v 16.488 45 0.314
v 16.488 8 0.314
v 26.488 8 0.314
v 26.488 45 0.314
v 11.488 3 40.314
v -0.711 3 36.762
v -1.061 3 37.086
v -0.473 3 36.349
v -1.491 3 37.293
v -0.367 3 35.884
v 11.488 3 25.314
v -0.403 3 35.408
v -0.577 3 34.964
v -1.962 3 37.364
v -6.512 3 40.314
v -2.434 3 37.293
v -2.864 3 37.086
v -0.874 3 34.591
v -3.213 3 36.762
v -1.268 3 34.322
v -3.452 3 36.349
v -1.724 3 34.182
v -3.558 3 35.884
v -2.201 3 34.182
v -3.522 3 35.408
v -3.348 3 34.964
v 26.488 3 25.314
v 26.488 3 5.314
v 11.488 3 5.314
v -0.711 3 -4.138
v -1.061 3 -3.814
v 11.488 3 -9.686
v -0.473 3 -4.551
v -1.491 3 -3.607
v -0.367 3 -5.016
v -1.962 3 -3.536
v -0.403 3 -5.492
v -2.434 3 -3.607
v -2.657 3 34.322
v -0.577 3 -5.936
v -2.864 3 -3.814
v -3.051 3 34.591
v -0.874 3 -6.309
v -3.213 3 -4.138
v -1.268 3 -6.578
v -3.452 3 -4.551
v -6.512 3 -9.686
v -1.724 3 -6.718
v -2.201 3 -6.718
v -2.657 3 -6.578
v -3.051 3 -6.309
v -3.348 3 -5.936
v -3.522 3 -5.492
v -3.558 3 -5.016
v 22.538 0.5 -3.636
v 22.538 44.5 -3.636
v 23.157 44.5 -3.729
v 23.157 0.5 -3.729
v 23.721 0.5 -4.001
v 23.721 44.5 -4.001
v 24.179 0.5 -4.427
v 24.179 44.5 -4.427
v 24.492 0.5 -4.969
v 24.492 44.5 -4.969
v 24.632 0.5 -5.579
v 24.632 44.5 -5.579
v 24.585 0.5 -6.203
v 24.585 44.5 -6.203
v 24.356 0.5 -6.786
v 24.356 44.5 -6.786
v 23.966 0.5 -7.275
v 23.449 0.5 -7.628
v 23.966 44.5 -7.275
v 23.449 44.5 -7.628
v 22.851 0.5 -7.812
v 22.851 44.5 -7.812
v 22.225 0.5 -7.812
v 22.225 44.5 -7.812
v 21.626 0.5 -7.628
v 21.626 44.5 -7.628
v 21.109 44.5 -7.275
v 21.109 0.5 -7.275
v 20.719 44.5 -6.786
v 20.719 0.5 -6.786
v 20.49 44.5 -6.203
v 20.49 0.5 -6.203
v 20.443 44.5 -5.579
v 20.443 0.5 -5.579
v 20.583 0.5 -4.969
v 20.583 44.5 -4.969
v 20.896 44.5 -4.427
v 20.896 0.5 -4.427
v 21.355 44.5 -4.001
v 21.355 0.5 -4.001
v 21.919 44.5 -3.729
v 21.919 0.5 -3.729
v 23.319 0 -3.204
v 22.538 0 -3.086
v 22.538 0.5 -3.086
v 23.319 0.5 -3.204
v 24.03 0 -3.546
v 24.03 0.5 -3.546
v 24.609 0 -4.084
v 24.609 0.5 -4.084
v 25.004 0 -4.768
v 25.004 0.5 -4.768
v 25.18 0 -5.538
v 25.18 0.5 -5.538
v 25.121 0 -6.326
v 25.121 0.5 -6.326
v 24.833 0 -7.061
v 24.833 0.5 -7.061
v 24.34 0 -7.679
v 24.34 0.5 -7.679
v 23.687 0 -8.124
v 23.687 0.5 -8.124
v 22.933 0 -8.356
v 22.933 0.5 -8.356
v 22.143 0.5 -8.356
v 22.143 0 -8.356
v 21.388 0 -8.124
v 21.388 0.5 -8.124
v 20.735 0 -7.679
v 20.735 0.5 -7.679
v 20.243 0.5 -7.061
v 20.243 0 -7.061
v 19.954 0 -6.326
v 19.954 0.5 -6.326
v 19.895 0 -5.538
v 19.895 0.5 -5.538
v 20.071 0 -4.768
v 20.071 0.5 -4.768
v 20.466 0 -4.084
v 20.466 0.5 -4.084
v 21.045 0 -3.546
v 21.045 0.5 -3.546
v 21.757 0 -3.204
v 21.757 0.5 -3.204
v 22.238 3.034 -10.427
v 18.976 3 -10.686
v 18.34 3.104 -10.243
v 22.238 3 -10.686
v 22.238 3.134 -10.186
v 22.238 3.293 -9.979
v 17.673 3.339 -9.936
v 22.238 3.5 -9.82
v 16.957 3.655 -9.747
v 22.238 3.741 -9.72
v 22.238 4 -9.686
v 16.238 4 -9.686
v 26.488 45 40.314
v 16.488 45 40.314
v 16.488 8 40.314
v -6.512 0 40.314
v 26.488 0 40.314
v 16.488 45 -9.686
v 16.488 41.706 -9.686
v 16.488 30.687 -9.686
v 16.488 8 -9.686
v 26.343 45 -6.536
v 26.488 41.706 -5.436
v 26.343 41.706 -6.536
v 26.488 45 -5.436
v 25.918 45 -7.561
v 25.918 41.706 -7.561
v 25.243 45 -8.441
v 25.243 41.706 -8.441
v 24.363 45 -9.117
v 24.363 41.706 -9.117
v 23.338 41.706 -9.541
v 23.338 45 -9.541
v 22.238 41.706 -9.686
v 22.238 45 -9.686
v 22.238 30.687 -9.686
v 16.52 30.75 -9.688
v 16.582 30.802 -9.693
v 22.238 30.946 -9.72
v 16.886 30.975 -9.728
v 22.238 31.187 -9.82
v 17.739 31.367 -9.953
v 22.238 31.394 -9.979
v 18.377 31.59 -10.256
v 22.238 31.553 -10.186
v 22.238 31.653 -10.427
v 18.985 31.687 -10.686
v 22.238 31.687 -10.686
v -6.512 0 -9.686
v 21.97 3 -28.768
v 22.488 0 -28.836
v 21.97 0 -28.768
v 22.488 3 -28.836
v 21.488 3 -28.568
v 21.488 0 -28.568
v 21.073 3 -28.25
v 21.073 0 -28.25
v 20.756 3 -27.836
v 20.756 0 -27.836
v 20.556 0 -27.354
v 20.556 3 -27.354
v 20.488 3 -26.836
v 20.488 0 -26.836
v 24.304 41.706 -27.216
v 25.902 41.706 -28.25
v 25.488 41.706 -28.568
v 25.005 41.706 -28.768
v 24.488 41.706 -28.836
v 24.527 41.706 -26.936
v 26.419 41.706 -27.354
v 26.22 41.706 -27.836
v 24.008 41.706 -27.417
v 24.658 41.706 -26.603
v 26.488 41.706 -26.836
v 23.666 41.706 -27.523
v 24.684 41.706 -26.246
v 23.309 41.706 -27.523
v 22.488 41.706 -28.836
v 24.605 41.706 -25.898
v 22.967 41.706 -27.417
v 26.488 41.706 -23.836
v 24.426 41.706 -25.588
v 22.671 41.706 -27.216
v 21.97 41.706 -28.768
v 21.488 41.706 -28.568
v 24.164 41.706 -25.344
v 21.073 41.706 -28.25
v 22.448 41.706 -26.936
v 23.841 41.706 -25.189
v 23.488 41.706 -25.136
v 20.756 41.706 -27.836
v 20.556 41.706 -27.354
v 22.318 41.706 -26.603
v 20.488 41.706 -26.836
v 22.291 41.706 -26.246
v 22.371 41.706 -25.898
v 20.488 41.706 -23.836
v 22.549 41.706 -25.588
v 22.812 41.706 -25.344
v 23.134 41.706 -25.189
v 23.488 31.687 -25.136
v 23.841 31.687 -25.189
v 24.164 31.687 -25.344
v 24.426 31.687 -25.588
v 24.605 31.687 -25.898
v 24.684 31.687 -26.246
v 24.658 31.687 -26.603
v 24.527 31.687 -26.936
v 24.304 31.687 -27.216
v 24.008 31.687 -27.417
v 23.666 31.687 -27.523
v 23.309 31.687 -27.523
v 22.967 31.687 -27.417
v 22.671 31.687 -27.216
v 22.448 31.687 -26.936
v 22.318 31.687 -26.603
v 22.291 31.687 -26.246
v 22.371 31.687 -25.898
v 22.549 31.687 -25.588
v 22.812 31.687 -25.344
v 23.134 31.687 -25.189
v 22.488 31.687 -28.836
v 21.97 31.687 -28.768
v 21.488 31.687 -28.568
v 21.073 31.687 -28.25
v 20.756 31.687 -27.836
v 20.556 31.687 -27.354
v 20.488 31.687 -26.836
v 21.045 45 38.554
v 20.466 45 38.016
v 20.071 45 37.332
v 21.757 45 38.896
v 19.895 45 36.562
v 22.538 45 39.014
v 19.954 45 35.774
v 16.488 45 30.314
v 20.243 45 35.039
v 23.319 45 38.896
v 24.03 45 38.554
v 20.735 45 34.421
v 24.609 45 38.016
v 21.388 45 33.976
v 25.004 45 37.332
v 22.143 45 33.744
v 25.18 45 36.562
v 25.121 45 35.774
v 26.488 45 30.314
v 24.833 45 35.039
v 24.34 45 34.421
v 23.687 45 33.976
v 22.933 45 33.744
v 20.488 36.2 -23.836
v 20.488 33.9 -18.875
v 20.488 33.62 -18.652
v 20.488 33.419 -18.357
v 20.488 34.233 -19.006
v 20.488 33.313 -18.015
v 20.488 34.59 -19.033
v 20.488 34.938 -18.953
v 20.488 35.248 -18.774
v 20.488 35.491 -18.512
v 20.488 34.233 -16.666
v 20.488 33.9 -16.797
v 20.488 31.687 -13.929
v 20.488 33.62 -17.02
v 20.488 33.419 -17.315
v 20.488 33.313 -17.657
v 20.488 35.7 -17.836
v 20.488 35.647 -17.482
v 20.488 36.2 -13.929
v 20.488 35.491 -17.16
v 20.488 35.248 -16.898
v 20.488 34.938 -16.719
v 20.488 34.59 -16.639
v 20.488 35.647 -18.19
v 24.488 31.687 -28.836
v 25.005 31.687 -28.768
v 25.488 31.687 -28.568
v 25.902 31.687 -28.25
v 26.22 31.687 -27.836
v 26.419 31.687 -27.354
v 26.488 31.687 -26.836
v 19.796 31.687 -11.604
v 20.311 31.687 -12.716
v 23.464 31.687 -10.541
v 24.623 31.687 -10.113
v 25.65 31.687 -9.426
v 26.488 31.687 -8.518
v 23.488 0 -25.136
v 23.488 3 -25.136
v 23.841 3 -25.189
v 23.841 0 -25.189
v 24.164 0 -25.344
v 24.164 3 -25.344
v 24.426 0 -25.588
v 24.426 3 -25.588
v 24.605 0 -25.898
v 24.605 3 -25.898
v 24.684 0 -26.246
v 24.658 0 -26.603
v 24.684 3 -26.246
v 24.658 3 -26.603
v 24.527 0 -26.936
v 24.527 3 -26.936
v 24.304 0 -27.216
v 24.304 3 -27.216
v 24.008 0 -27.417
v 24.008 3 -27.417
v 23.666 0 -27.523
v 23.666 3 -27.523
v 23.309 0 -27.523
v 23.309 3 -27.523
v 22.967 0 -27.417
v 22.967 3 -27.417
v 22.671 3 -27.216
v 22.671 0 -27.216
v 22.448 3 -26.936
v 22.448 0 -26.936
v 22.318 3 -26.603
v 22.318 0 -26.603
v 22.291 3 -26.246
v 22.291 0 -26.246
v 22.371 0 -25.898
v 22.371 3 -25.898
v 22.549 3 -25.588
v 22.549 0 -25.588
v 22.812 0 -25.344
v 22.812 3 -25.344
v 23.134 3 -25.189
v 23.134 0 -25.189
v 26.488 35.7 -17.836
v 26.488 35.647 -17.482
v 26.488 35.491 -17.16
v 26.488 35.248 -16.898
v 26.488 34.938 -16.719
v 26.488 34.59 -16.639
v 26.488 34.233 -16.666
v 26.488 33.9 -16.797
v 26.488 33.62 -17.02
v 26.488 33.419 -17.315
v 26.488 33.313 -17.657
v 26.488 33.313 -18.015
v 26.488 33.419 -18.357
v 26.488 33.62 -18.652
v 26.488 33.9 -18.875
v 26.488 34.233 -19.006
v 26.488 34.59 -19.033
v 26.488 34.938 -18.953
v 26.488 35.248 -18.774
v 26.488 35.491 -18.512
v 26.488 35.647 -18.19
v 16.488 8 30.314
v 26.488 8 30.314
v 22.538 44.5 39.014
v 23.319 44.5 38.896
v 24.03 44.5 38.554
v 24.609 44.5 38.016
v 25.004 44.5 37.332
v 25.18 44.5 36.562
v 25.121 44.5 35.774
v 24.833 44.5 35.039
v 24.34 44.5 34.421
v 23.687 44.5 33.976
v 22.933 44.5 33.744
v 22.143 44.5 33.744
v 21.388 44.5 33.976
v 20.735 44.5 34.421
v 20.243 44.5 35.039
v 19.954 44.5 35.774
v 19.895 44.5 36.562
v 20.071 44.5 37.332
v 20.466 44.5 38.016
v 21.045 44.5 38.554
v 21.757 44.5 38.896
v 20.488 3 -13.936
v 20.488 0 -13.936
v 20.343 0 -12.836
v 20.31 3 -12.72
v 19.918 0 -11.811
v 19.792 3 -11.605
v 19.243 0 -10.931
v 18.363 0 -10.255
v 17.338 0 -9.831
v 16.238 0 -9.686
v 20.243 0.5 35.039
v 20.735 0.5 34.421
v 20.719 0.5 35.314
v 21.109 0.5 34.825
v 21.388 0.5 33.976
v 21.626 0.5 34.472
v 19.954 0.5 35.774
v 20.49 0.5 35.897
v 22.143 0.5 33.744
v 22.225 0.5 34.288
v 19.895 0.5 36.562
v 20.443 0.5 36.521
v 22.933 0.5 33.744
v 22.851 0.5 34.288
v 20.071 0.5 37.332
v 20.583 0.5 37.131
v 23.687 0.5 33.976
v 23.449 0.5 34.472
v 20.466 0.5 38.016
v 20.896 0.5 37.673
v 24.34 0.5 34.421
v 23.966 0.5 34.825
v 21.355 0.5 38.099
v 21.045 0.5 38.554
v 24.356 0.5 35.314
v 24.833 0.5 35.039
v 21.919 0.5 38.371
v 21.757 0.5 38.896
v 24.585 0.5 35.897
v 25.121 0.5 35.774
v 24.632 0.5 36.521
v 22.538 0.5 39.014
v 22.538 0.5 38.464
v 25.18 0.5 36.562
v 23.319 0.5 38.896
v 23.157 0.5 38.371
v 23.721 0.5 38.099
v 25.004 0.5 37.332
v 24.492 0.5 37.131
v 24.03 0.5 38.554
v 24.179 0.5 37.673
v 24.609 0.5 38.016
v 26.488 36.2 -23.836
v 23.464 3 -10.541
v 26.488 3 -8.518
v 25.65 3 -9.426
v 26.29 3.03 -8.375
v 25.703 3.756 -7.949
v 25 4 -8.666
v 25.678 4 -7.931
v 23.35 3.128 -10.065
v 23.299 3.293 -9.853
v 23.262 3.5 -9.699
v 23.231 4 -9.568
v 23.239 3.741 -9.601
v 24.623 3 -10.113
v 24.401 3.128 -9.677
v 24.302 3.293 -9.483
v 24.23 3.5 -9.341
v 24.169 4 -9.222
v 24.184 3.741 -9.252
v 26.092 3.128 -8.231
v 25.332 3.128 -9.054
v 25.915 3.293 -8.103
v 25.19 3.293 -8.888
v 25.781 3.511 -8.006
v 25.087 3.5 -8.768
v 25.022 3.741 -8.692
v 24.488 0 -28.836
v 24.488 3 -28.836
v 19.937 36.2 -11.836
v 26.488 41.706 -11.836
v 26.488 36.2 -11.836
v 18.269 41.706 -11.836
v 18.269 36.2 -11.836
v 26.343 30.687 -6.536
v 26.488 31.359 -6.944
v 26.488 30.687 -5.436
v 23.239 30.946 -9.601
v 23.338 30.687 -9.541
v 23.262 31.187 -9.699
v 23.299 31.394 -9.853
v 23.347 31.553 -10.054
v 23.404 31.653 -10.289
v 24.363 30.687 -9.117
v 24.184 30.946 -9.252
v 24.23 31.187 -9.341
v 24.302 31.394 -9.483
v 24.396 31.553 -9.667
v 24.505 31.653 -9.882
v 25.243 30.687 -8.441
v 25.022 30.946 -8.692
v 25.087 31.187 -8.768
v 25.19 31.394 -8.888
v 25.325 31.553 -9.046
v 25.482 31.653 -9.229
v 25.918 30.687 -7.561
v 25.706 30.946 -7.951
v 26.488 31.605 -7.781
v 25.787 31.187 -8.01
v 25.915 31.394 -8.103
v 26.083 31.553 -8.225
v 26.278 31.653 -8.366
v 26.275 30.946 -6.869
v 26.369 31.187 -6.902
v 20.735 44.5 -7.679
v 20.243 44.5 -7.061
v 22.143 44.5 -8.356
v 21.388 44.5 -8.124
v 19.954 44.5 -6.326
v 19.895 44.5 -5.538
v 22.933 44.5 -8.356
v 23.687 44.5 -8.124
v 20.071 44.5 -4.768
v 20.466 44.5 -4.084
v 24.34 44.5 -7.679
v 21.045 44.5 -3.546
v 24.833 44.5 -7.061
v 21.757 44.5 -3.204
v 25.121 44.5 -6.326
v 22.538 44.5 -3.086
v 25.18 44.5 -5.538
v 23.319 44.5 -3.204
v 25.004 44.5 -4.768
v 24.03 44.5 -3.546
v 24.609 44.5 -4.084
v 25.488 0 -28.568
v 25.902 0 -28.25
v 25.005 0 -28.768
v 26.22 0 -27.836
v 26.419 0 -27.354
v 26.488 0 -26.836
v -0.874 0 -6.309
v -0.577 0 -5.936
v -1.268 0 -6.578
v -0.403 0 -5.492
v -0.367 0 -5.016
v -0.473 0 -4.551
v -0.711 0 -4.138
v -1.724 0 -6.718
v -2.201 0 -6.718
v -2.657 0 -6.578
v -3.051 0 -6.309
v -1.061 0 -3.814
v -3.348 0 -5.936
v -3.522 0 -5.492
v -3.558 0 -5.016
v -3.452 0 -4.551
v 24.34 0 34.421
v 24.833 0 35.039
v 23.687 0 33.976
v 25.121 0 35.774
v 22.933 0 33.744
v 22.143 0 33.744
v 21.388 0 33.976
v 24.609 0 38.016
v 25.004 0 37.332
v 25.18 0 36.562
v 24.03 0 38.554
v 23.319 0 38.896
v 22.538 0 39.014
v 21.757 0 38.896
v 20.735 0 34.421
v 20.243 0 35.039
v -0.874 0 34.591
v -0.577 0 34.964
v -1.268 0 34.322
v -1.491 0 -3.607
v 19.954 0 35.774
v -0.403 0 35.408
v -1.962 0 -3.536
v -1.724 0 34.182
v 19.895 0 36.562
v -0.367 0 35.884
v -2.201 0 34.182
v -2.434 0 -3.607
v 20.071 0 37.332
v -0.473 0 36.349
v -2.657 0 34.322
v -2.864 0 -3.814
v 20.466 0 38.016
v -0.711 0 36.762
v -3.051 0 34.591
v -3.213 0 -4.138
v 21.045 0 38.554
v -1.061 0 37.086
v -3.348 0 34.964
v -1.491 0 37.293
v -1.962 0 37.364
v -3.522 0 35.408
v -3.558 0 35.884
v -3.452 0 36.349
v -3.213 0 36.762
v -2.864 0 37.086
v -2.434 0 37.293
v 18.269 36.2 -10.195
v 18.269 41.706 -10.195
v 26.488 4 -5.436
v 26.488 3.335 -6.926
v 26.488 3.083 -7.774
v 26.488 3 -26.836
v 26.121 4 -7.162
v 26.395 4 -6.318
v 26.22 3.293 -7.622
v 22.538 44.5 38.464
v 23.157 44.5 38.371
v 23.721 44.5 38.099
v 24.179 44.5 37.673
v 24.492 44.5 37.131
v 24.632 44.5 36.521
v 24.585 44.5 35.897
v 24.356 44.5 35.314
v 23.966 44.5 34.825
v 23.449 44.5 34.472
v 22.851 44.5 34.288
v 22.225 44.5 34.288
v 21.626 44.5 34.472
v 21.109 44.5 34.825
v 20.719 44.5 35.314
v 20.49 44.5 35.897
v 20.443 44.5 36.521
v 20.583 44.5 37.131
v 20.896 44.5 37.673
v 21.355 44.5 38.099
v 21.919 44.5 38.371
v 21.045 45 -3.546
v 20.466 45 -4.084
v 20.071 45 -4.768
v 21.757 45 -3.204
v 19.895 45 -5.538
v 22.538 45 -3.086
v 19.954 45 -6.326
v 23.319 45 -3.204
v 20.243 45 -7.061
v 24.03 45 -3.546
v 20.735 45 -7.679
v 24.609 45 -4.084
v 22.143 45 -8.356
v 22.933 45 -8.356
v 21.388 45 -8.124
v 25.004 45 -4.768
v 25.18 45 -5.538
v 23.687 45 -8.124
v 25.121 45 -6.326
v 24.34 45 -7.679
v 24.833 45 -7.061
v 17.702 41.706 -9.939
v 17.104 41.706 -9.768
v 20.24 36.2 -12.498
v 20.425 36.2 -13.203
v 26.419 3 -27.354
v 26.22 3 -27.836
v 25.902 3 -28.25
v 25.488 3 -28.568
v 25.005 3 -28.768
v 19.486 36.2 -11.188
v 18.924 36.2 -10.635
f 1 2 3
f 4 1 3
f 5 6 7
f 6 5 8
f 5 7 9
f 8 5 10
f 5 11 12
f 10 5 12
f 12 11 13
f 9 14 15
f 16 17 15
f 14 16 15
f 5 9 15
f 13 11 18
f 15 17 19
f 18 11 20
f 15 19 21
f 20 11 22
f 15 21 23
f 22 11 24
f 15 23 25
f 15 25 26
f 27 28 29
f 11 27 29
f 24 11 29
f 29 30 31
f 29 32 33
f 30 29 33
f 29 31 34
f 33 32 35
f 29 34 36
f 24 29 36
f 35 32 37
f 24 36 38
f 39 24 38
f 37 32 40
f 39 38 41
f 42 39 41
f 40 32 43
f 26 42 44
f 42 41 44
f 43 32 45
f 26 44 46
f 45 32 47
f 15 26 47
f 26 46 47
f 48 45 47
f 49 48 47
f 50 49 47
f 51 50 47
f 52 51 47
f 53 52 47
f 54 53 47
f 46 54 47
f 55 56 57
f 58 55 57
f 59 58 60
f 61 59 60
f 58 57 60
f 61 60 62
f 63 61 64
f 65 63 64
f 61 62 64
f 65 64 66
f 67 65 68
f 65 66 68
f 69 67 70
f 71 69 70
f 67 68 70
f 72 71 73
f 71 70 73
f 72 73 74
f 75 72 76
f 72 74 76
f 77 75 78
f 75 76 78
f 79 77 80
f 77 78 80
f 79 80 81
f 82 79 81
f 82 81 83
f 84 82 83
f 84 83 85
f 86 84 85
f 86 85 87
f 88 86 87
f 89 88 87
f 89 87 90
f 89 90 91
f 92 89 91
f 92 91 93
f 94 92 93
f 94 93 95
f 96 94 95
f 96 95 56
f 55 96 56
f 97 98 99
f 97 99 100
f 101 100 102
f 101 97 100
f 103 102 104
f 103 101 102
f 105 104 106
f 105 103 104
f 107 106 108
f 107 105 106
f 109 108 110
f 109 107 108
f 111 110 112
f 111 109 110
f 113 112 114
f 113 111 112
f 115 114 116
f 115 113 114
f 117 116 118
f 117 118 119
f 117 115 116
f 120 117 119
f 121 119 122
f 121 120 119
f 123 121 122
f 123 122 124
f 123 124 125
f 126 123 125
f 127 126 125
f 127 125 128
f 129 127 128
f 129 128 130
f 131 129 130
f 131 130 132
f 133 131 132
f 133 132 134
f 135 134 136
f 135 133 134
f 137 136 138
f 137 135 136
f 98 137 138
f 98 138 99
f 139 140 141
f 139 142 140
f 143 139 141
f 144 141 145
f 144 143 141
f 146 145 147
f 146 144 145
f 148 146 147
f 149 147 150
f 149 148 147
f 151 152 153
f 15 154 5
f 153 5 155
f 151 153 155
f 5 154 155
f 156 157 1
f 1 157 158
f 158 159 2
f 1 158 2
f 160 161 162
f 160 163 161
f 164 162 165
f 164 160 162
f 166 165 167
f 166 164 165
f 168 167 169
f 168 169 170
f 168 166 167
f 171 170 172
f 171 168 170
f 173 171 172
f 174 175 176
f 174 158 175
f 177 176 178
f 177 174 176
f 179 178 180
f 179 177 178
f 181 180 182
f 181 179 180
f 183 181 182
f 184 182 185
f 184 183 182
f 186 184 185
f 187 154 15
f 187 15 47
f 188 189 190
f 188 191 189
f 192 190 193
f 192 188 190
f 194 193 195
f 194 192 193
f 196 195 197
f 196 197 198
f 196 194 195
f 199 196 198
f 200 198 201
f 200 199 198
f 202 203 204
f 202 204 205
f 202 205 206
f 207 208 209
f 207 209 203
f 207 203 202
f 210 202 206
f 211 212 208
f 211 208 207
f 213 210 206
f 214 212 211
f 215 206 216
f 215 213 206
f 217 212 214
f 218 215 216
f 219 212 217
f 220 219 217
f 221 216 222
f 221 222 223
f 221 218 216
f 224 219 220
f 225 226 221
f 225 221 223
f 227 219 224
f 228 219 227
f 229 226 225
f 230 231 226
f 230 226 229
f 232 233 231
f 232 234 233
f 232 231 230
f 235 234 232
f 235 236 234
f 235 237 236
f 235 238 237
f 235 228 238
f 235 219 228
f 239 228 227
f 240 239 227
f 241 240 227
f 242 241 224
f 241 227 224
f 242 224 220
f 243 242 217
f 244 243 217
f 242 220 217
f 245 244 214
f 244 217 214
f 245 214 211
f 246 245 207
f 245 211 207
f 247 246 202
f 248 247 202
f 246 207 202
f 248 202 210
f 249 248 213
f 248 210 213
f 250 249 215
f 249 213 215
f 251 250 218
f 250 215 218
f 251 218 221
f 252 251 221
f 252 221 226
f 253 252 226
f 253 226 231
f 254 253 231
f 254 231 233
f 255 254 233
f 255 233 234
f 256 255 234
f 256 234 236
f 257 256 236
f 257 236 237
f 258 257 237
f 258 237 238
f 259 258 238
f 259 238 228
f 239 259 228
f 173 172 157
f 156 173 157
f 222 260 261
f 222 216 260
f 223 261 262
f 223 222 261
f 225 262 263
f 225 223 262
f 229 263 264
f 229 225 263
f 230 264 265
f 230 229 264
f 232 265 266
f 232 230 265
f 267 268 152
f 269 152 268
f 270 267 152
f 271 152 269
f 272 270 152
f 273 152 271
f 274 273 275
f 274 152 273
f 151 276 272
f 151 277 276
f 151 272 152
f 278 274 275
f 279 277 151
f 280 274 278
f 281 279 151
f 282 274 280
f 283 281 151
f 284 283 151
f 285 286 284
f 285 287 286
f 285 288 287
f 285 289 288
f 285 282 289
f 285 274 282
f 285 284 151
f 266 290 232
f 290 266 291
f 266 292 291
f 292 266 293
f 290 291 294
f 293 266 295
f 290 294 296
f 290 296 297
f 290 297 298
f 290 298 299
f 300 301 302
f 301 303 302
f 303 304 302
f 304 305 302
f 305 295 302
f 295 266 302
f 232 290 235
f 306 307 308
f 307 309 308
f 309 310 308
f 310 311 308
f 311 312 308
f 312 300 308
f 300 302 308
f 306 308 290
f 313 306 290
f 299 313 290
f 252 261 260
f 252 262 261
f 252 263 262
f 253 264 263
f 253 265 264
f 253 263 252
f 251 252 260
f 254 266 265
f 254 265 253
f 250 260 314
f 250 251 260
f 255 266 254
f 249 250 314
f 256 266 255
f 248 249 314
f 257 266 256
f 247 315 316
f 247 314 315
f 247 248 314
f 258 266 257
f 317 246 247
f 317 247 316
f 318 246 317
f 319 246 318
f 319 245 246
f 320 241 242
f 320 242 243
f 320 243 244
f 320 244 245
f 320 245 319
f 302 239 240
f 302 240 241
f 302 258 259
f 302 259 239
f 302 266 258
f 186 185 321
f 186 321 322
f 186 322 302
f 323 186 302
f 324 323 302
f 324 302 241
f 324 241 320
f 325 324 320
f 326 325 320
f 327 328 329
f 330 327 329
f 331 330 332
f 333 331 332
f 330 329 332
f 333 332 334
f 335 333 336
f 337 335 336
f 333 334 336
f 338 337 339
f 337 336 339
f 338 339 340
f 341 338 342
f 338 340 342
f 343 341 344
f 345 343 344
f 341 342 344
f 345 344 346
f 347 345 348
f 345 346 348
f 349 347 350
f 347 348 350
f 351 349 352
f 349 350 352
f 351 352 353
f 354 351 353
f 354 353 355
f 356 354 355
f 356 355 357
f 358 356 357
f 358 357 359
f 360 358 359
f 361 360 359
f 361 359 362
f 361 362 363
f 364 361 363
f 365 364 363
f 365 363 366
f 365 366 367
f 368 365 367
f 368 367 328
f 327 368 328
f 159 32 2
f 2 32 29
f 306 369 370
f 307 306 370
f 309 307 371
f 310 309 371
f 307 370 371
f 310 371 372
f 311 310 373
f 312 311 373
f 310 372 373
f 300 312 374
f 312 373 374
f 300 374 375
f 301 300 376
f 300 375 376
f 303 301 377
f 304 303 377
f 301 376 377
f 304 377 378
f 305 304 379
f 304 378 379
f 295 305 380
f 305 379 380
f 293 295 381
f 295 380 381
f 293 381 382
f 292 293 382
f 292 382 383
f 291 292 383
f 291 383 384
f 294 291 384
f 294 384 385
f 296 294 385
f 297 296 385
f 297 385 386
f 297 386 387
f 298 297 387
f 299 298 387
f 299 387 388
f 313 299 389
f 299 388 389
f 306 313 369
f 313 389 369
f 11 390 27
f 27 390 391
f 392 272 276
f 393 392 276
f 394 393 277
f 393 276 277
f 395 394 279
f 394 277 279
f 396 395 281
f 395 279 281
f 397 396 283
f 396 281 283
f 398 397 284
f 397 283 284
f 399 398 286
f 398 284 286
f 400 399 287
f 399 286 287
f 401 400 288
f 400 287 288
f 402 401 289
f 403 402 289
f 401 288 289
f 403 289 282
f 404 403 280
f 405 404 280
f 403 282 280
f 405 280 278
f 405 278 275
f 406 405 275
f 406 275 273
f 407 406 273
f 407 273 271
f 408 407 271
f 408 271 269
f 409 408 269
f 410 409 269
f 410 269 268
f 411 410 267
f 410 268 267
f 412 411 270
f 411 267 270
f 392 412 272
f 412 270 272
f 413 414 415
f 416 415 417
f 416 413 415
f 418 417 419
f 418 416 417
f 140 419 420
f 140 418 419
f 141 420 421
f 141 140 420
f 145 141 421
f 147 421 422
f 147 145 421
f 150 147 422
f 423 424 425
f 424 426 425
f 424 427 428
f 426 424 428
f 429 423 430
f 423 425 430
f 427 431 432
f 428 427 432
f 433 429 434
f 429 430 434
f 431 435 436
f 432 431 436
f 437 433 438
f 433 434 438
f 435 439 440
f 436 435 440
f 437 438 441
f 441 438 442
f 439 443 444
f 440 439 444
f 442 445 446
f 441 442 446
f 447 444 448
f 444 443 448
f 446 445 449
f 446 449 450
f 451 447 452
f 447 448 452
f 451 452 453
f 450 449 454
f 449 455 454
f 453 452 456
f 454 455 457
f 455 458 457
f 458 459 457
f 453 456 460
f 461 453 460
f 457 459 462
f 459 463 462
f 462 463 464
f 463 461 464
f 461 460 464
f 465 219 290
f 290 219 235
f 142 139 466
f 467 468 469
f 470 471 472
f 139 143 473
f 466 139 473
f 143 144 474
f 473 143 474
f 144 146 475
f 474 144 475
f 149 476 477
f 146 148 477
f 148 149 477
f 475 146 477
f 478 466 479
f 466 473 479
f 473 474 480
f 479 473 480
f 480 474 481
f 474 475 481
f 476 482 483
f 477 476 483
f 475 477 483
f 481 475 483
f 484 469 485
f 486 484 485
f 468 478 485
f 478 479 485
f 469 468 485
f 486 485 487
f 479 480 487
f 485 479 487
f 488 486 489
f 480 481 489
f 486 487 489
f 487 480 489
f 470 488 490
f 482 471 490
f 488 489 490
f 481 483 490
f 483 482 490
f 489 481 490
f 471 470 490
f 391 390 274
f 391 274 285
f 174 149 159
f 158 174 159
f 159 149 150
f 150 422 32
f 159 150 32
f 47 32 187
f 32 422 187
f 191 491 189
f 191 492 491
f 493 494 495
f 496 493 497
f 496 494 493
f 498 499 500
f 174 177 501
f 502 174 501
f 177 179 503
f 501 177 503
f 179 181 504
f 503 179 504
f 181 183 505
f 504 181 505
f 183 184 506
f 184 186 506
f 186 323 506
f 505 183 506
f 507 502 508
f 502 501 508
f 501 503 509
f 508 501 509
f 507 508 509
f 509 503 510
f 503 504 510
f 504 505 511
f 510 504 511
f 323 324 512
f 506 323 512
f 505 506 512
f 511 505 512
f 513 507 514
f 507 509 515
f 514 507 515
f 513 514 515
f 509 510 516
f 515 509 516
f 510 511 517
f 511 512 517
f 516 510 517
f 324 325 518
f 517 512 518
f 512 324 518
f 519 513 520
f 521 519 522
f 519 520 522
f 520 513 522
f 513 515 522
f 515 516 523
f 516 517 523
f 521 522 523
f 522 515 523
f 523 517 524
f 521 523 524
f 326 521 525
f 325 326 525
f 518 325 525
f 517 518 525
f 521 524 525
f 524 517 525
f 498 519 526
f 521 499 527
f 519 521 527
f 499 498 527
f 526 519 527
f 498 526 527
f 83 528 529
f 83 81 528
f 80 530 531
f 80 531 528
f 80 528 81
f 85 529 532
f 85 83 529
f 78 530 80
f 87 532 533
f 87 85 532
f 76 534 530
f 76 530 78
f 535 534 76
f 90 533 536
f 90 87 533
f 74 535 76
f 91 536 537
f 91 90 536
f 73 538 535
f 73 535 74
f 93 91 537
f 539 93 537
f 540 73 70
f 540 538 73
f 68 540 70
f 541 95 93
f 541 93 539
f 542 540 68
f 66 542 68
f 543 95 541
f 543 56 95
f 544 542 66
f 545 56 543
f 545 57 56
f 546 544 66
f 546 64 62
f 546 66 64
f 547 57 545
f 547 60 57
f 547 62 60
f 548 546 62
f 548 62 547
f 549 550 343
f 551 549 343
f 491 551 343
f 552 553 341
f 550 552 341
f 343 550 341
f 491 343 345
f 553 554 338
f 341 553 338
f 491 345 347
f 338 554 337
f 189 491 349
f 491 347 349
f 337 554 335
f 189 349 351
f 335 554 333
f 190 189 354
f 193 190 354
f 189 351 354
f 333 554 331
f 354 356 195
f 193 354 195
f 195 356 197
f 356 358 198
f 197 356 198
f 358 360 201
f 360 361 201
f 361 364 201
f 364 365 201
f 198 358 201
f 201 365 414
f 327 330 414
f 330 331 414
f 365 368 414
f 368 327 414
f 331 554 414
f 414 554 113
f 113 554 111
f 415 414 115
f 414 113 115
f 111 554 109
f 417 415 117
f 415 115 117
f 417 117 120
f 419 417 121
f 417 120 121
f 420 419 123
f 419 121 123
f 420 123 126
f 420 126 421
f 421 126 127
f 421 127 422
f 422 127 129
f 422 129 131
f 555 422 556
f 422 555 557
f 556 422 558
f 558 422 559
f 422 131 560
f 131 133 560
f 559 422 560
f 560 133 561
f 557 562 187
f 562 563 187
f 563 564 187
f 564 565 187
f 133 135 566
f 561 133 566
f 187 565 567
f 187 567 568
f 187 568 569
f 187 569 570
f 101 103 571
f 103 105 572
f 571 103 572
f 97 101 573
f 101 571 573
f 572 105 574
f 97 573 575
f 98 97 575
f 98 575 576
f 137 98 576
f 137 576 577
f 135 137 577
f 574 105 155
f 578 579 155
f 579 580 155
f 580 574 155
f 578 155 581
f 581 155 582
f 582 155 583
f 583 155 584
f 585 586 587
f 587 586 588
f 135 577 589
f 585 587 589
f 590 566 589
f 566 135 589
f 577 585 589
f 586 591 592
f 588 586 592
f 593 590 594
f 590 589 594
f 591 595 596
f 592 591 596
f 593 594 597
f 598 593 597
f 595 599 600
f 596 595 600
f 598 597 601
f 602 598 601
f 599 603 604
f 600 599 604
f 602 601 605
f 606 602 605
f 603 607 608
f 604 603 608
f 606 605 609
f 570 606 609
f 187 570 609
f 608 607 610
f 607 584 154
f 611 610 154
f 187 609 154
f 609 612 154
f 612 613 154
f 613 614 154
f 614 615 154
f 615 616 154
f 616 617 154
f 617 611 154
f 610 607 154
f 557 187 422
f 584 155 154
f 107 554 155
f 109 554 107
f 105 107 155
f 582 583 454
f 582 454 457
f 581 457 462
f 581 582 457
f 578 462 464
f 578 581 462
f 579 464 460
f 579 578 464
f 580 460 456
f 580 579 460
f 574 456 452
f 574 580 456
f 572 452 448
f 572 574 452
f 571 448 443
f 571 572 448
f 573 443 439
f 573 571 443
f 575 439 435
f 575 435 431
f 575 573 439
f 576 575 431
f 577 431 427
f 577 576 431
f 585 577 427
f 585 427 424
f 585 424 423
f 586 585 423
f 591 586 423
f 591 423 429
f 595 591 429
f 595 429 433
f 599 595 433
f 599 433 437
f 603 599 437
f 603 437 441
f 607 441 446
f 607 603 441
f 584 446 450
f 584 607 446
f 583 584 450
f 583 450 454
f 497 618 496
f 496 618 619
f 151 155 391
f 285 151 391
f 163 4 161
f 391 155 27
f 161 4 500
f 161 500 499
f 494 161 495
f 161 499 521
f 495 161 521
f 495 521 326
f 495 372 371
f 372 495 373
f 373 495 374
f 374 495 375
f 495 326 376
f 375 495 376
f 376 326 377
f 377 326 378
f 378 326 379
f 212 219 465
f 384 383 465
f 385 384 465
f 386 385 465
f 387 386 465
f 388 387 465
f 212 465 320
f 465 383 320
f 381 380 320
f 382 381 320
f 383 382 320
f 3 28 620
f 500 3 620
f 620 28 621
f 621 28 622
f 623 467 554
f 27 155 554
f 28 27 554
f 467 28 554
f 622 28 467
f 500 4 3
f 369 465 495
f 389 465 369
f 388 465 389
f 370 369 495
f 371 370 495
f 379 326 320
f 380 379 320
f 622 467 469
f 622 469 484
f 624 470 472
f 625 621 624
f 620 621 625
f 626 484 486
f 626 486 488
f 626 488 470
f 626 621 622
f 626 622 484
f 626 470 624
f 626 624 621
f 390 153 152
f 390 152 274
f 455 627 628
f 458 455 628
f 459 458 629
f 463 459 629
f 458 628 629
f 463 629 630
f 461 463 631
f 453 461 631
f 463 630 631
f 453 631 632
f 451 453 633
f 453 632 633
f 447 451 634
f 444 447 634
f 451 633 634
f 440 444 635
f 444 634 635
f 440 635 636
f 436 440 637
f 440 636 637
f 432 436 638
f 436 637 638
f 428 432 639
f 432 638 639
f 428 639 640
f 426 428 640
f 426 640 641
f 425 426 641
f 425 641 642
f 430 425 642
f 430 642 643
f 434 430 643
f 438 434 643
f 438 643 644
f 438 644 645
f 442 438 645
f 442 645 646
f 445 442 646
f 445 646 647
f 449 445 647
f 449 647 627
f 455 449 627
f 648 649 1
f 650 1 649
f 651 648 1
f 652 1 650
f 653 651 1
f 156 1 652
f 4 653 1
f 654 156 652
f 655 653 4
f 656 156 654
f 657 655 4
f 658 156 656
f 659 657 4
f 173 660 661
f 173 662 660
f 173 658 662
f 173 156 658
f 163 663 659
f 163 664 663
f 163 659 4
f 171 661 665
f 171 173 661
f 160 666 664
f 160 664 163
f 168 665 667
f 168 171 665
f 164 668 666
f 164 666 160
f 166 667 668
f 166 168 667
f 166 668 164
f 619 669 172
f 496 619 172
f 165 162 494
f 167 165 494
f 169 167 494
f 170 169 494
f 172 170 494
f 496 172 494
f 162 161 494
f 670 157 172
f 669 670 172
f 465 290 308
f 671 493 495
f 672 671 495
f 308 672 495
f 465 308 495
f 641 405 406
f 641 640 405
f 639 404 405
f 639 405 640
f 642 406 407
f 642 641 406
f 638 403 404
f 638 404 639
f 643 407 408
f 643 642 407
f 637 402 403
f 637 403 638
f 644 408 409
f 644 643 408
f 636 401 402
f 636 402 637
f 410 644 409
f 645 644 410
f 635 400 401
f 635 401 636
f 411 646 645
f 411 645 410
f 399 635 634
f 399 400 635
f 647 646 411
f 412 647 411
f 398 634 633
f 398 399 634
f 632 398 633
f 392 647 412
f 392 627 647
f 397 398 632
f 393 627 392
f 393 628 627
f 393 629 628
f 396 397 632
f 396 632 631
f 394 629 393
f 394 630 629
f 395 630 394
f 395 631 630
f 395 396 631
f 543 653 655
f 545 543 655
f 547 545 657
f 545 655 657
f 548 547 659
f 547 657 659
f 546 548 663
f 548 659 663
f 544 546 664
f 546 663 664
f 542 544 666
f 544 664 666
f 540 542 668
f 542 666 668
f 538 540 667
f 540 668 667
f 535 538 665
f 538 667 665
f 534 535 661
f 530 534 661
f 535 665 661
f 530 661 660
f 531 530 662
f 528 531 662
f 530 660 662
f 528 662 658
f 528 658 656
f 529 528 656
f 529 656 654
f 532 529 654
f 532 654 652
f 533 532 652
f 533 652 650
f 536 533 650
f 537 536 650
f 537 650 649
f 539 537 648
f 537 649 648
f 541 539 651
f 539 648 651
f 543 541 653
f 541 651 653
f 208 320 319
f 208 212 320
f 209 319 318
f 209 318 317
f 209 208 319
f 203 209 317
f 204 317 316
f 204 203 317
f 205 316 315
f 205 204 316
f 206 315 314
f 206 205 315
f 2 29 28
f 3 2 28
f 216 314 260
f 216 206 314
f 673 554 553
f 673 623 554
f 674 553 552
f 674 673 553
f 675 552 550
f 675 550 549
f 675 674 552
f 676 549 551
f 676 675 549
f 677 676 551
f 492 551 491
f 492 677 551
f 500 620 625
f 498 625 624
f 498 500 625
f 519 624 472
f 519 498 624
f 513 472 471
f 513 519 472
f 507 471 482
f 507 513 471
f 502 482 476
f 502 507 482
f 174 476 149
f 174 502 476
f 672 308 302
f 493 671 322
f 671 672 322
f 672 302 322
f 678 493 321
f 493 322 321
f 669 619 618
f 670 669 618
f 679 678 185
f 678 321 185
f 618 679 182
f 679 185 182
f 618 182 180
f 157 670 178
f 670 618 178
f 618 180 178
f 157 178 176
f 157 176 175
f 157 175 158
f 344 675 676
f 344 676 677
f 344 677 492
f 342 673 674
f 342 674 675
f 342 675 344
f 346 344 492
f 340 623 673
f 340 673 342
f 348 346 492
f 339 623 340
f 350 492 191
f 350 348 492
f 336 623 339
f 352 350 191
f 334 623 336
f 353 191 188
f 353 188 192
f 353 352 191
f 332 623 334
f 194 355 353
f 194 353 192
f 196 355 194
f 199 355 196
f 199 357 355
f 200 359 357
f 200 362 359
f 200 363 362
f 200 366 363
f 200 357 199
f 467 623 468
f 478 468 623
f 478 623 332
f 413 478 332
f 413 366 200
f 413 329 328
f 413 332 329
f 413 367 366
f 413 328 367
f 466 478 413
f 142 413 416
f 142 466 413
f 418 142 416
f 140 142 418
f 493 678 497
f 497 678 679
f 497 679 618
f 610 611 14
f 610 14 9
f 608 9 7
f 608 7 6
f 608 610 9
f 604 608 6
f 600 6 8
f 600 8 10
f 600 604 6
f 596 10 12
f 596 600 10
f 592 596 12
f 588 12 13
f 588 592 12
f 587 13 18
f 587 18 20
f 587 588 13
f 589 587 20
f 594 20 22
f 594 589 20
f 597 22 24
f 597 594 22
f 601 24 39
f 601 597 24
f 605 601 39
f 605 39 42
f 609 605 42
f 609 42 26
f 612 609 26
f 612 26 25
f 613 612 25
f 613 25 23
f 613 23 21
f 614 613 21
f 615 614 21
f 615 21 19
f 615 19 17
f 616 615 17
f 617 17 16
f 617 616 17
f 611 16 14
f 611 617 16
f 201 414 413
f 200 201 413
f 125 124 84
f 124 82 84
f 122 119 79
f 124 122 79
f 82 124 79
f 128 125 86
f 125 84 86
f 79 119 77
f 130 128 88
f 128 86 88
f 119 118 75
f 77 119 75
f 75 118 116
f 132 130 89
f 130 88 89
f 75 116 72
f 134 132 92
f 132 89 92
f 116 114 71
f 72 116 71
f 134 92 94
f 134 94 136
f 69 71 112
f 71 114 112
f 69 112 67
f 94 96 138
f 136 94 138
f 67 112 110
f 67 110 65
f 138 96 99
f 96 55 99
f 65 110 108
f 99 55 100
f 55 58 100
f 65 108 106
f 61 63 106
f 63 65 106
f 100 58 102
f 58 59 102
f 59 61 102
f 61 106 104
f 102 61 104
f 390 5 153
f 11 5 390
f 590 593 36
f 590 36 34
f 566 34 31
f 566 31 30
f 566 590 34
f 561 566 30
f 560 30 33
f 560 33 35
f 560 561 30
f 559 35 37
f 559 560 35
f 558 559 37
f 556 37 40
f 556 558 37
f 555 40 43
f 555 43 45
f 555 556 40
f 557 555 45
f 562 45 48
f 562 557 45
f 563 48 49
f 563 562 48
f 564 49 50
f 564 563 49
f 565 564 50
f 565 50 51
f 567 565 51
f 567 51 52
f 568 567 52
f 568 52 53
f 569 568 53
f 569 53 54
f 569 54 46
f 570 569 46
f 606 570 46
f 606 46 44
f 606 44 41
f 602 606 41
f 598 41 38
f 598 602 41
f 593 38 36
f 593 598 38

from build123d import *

# Parameters (mm, degrees)
SKETCH1_R           = 1.5999999999999974
SKETCH1_R_2         = 1.6
BOSS_EXTRUDE1_DEPTH = 3
SKETCH2_W           = 10.000000000000004
SKETCH2_H           = 10.000000000000004
BOSS_EXTRUDE2_DEPTH = 42
CHAMFER1_SIZE       = 5
SKETCH3_R           = 2.1
SKETCH3_R_2         = 2.1000000000000005
CUT_EXTRUDE1_DEPTH  = 52.00000000000001
SKETCH4_R           = 2.65
SKETCH4_R_2         = 2.6500000000000004
CUT_EXTRUDE2_DEPTH  = 0.5
BOSS_EXTRUDE3_DEPTH = 14.15
SKETCH6_R           = 1.2000000000000004
CUT_EXTRUDE3_DEPTH  = 6
SKETCH7_W           = 6
SKETCH7_H           = 10.018921584932333
BOSS_EXTRUDE4_DEPTH = 5
BOSS_EXTRUDE5_DEPTH = 2.15
SKETCH9_W           = 6
SKETCH9_H           = 3
BOSS_EXTRUDE6_DEPTH = 19.15
SKETCH10_R          = 1.2000000000000004
CUT_EXTRUDE4_DEPTH  = 64.7666045986287
FILLET3_R           = 2
FILLET4_R           = 4.25
FILLET5_R           = 4.25
FILLET6_R           = 4.25
FILLET7_R           = 4.25
FILLET8_R           = 1
FILLET9_R           = 1


with BuildPart() as part:
    # Sketch1 → Boss-Extrude1 (new body)
    with BuildSketch(Plane(origin=(0, 0, 0), x_dir=(1, 0, 0), z_dir=(0, 1, 0))):
        Polygon((-6.5123966942148765, 9.68595041322314), (1.487603305785124, 9.68595041322314), (26.48760330578513, 9.68595041322314), (26.487603305785132, -40.31404958677687), (1.4876033057851312, -40.31404958677687), (-6.512396694214871, -40.31404958677687), align=None)
        with Locations(Location((-1.962396694214872, -35.76404958677687, 0), (0, 0, 270))):
            Circle(SKETCH1_R, mode=Mode.SUBTRACT)
        with Locations(Location((-1.9623966942148756, 5.135950413223139, 0), (0, 0, 270))):
            Circle(SKETCH1_R_2, mode=Mode.SUBTRACT)
    extrude(amount=BOSS_EXTRUDE1_DEPTH)

    # Sketch2 → Boss-Extrude2 (add)
    with BuildSketch(Plane(origin=(0, 3, 0), x_dir=(1, 0, 0), z_dir=(0, 1, 0))):
        with Locations((21.48760330578513, -35.31404958677687)):
            Rectangle(SKETCH2_W, SKETCH2_H)
        Polygon((26.48760330578513, 9.68595041322314), (16.48760330578513, 9.685950413223138), (16.487603305785125, -0.314049586776863), (26.48760330578513, -0.31404958677686173), align=None)
    extrude(amount=BOSS_EXTRUDE2_DEPTH)

    # Chamfer1
    chamfer1_edges = [part.edges().sort_by_distance(p)[0] for p in [
        (21.48760330578513, 3, 30.314049586776864),
        (16.48760330578513, 3, 35.31404958677687),
        (16.48760330578513, 3, -4.6859504132231375),
        (21.48760330578513, 3, 0.31404958677686234),
    ]]
    chamfer(chamfer1_edges, length=CHAMFER1_SIZE)

    # Sketch3 → Cut-Extrude1 (cut)
    with BuildSketch(Plane(origin=(0, 45.00000000000001, 0), x_dir=(1, 0, 0), z_dir=(0, 1, 0))):
        with Locations(Location((22.53760330578513, -36.364049586776865, 0), (0, 0, 270))):
            Circle(SKETCH3_R)
        with Locations(Location((22.53760330578513, 5.735950413223138, 0), (0, 0, 270))):
            Circle(SKETCH3_R_2)
    extrude(amount=-CUT_EXTRUDE1_DEPTH, mode=Mode.SUBTRACT)

    # Sketch4 → Cut-Extrude2 (cut)
    with BuildSketch(Plane(origin=(0, 45.00000000000001, 0), x_dir=(1, 0, 0), z_dir=(0, 1, 0))):
        with Locations(Location((22.53760330578513, -36.364049586776865, 0), (0, 0, 270))):
            Circle(SKETCH4_R)
        with Locations(Location((22.53760330578513, 5.735950413223138, 0), (0, 0, 270))):
            Circle(SKETCH4_R_2)
    cut_extrude2 = extrude(amount=-CUT_EXTRUDE2_DEPTH, mode=Mode.SUBTRACT)

    # Mirror1: Cut-Extrude2 across plane
    add(cut_extrude2.mirror(Plane(origin=(0, 22.500000000000004, 0), x_dir=(0, 0, 1), z_dir=(0, -1, 0))), mode=Mode.SUBTRACT)

    # Sketch5 → Boss-Extrude3 (add)
    with BuildSketch(Plane(origin=(0, 0, -9.68595041322314), x_dir=(-1, 0, 0), z_dir=(0, 0, -1))):
        Polygon((-20.487603305785136, 36.20000000000077), (-26.487603305785136, 36.20000000000077), (-26.487603305785132, 31.68676314830412), (-20.487603305785132, 31.68676314830412), align=None)
    extrude(amount=BOSS_EXTRUDE3_DEPTH)

    # Sketch6 → Cut-Extrude3 (cut)
    with BuildSketch(Plane(origin=(26.48760330578513, 0, -1.84e-15), x_dir=(0, 0, -1), z_dir=(1, -7.7e-16, 0))):
        with Locations(Location((17.835950413222832, 34.50000000000082, 0), (0, 0, 90))):
            Circle(SKETCH6_R)
    extrude(amount=-CUT_EXTRUDE3_DEPTH, mode=Mode.SUBTRACT)

    # Sketch7 → Boss-Extrude4 (add)
    with BuildSketch(Plane(origin=(1.35e-15, 1.098e-14, -23.835950413222633), x_dir=(-1, 0, -6e-17), z_dir=(6e-17, 4.6e-16, -1))):
        with Locations((-23.487603305785132, 36.696223940770274)):
            Rectangle(SKETCH7_W, SKETCH7_H)
    extrude(amount=BOSS_EXTRUDE4_DEPTH)

    # Sketch8 → Boss-Extrude5 (add)
    with BuildSketch(Plane(origin=(0, 0, -9.68595041322314), x_dir=(-1, 0, 0), z_dir=(0, 0, -1))):
        Polygon((-26.487603305785136, 36.20000000000077), (-18.268679093182527, 36.2000000000008), (-18.268679093182527, 41.70568473323645), (-26.487603305785136, 41.70568473323645), align=None)
    extrude(amount=BOSS_EXTRUDE5_DEPTH)

    # Sketch9 → Boss-Extrude6 (add)
    with BuildSketch(Plane(origin=(0, 0, -9.68595041322314), x_dir=(-1, 0, 0), z_dir=(0, 0, -1))):
        with Locations((-23.487603305785132, 1.5)):
            Rectangle(SKETCH9_W, SKETCH9_H)
    extrude(amount=BOSS_EXTRUDE6_DEPTH)

    # Sketch10 → Cut-Extrude4 (cut, through all)
    with BuildSketch(Plane(origin=(0, 41.70568473323644, 1.921e-14), x_dir=(1, 0, 0), z_dir=(0, 1, 4.6e-16))):
        with Locations(Location((23.487603305785132, 26.335950413222633, 0), (0, 0, 270))):
            Circle(SKETCH10_R)
    extrude(amount=-CUT_EXTRUDE4_DEPTH, mode=Mode.SUBTRACT)

    # Fillet3
    fillet3_edges = [part.edges().sort_by_distance(p)[0] for p in [
        (26.487603305785132, 36.69622394077029, -28.835950413222616),
        (20.487603305785132, 36.69622394077029, -28.835950413222616),
        (20.487603305785132, 1.5, -28.835950413223138),
        (26.487603305785132, 1.5, -28.835950413223138),
    ]]
    fillet(fillet3_edges, radius=FILLET3_R)

    # Fillet4
    fillet4_edges = [part.edges().sort_by_distance(p)[0] for p in [
        (26.48760330578513, 17.343381574152062, -9.68595041322314),
    ]]
    fillet(fillet4_edges, radius=FILLET4_R)

    # Fillet5
    fillet5_edges = [part.edges().sort_by_distance(p)[0] for p in [
        (20.487603305785132, 1.5, -9.68595041322314),
    ]]
    fillet(fillet5_edges, radius=FILLET5_R)

    # Fillet6
    fillet6_edges = [part.edges().sort_by_distance(p)[0] for p in [
        (26.48760330578513, 43.352842366618226, -9.68595041322314),
    ]]
    fillet(fillet6_edges, radius=FILLET6_R)

    # Fillet7
    # the kernel refuses this fillet: 4.25 mm, written as the material it adds along each edge
    with BuildSketch(Plane(origin=(20.487603305785132, 31.68676314830412, -9.68595041322314), x_dir=(-1, 7.9e-16, 8.9e-16), z_dir=(7.9e-16, 1, 0))) as fillet7_piece_1:
        with BuildLine():
            CenterArc((4.2499999999999964, -4.242640687119286), FILLET7_R, 93.37228668343381, 86.62771331656613)
            Line((-3.77e-15, -4.242640687119282), (0, 0))
            Line((0, 0), (4.0000000000000036, 0))
        make_face()
    extrude(amount=4.51323685169665)
    with BuildSketch(Plane(origin=(20.48760330578512, 21.08016143050591, -9.68595041322314), x_dir=(-1, 7.9e-16, 0), z_dir=(7.9e-16, 1, 0))) as fillet7_piece_2_section:
        with BuildLine():
            CenterArc((4.2499999999999964, -4.242640687119284), FILLET7_R, 93.37228668343396, 86.62771331656604)
            Line((-3.55e-15, -4.242640687119284), (0, 0))
            Line((0, 0), (3.999999999999993, 0))
        make_face()
    fillet7_piece_2 = extrude(amount=25.726440287293073, mode=Mode.PRIVATE)
    fillet7_piece_2 = split(fillet7_piece_2, bisect_by=Plane(origin=(17.40856960112635, 36.2000000000008, -9.834246197287131), z_dir=(3.46e-15, 1, 0)), keep=Keep.TOP, mode=Mode.PRIVATE)
    fillet7_piece_2 = split(fillet7_piece_2, bisect_by=Plane(origin=(18.268679093182527, 38.95284236661862, -9.834246197287131), z_dir=(-1, 0, 0)), keep=Keep.TOP, mode=Mode.PRIVATE)
    fillet7_piece_2 = split(fillet7_piece_2, bisect_by=Plane(origin=(17.40856960112636, 41.70568473323645, -9.834246197287131), z_dir=(0, -1, 0)), keep=Keep.TOP, mode=Mode.PRIVATE)
    add(fillet7_piece_2)

    # Fillet8
    fillet8_edges = [part.edges().sort_by_distance(p)[0] for p in [
        (19.23760330578513, 3, -9.68595041322314),
        (25.242807125827955, 3, -8.441154233265967),
    ]]
    fillet(fillet8_edges, radius=FILLET8_R)

    # Fillet9
    # the kernel refuses this fillet: 1 mm, written as the material it adds along each edge
    with BuildSketch(Plane(origin=(22.23760330578513, 31.68676314830412, -9.68595041322314), x_dir=(2.101e-14, -1, 0), z_dir=(-1, -2.101e-14, 4.881e-14))) as fillet9_piece_1_section:
        with BuildLine():
            CenterArc((FILLET9_R, -FILLET9_R), FILLET9_R, 90, 90)
            Line((0, -FILLET9_R), (0, 0))
            Line((0, 0), (FILLET9_R, 0))
        make_face()
    fillet9_piece_1 = extrude(amount=5.750000000000124, mode=Mode.PRIVATE)
    fillet9_piece_1 = fillet9_piece_1 - Plane(origin=(16.237603305785, 31.449849305224696, -13.928591100342), x_dir=(-1, 0, 0), z_dir=(0, -1, 0)) * Cylinder(4.25, 16, mode=Mode.PRIVATE)
    add(fillet9_piece_1)
    with BuildSketch(Plane(origin=(22.23760330578513, 31.68676314830412, -5.43595041322314), x_dir=(0, 0, -1), z_dir=(-1, 0, 0))) as fillet9_piece_2_section:
        with BuildLine():
            CenterArc((4.249999999999999 + FILLET9_R, FILLET9_R), FILLET9_R, 180.00000000000693, 89.99999999999307)
            Line((4.249999999999999, FILLET9_R), (4.249999999999999, 0))
            Line((4.249999999999999, 0), (4.249999999999999 + FILLET9_R, 1.2079e-13))
        make_face()
    fillet9_piece_2 = revolve(axis=Axis((22.23760330578513, 31.68676314830412, -5.43595041322314), (0, -1, 0)), revolution_arc=123.71693864409282, mode=Mode.PRIVATE)
    fillet9_piece_2 = split(fillet9_piece_2, bisect_by=Plane(origin=(26.48760330578513, 31.521836885030236, -9.895455596994594), z_dir=(-1, 0, 7e-17)), keep=Keep.TOP, mode=Mode.PRIVATE)
    add(fillet9_piece_2)


solid = part.part
